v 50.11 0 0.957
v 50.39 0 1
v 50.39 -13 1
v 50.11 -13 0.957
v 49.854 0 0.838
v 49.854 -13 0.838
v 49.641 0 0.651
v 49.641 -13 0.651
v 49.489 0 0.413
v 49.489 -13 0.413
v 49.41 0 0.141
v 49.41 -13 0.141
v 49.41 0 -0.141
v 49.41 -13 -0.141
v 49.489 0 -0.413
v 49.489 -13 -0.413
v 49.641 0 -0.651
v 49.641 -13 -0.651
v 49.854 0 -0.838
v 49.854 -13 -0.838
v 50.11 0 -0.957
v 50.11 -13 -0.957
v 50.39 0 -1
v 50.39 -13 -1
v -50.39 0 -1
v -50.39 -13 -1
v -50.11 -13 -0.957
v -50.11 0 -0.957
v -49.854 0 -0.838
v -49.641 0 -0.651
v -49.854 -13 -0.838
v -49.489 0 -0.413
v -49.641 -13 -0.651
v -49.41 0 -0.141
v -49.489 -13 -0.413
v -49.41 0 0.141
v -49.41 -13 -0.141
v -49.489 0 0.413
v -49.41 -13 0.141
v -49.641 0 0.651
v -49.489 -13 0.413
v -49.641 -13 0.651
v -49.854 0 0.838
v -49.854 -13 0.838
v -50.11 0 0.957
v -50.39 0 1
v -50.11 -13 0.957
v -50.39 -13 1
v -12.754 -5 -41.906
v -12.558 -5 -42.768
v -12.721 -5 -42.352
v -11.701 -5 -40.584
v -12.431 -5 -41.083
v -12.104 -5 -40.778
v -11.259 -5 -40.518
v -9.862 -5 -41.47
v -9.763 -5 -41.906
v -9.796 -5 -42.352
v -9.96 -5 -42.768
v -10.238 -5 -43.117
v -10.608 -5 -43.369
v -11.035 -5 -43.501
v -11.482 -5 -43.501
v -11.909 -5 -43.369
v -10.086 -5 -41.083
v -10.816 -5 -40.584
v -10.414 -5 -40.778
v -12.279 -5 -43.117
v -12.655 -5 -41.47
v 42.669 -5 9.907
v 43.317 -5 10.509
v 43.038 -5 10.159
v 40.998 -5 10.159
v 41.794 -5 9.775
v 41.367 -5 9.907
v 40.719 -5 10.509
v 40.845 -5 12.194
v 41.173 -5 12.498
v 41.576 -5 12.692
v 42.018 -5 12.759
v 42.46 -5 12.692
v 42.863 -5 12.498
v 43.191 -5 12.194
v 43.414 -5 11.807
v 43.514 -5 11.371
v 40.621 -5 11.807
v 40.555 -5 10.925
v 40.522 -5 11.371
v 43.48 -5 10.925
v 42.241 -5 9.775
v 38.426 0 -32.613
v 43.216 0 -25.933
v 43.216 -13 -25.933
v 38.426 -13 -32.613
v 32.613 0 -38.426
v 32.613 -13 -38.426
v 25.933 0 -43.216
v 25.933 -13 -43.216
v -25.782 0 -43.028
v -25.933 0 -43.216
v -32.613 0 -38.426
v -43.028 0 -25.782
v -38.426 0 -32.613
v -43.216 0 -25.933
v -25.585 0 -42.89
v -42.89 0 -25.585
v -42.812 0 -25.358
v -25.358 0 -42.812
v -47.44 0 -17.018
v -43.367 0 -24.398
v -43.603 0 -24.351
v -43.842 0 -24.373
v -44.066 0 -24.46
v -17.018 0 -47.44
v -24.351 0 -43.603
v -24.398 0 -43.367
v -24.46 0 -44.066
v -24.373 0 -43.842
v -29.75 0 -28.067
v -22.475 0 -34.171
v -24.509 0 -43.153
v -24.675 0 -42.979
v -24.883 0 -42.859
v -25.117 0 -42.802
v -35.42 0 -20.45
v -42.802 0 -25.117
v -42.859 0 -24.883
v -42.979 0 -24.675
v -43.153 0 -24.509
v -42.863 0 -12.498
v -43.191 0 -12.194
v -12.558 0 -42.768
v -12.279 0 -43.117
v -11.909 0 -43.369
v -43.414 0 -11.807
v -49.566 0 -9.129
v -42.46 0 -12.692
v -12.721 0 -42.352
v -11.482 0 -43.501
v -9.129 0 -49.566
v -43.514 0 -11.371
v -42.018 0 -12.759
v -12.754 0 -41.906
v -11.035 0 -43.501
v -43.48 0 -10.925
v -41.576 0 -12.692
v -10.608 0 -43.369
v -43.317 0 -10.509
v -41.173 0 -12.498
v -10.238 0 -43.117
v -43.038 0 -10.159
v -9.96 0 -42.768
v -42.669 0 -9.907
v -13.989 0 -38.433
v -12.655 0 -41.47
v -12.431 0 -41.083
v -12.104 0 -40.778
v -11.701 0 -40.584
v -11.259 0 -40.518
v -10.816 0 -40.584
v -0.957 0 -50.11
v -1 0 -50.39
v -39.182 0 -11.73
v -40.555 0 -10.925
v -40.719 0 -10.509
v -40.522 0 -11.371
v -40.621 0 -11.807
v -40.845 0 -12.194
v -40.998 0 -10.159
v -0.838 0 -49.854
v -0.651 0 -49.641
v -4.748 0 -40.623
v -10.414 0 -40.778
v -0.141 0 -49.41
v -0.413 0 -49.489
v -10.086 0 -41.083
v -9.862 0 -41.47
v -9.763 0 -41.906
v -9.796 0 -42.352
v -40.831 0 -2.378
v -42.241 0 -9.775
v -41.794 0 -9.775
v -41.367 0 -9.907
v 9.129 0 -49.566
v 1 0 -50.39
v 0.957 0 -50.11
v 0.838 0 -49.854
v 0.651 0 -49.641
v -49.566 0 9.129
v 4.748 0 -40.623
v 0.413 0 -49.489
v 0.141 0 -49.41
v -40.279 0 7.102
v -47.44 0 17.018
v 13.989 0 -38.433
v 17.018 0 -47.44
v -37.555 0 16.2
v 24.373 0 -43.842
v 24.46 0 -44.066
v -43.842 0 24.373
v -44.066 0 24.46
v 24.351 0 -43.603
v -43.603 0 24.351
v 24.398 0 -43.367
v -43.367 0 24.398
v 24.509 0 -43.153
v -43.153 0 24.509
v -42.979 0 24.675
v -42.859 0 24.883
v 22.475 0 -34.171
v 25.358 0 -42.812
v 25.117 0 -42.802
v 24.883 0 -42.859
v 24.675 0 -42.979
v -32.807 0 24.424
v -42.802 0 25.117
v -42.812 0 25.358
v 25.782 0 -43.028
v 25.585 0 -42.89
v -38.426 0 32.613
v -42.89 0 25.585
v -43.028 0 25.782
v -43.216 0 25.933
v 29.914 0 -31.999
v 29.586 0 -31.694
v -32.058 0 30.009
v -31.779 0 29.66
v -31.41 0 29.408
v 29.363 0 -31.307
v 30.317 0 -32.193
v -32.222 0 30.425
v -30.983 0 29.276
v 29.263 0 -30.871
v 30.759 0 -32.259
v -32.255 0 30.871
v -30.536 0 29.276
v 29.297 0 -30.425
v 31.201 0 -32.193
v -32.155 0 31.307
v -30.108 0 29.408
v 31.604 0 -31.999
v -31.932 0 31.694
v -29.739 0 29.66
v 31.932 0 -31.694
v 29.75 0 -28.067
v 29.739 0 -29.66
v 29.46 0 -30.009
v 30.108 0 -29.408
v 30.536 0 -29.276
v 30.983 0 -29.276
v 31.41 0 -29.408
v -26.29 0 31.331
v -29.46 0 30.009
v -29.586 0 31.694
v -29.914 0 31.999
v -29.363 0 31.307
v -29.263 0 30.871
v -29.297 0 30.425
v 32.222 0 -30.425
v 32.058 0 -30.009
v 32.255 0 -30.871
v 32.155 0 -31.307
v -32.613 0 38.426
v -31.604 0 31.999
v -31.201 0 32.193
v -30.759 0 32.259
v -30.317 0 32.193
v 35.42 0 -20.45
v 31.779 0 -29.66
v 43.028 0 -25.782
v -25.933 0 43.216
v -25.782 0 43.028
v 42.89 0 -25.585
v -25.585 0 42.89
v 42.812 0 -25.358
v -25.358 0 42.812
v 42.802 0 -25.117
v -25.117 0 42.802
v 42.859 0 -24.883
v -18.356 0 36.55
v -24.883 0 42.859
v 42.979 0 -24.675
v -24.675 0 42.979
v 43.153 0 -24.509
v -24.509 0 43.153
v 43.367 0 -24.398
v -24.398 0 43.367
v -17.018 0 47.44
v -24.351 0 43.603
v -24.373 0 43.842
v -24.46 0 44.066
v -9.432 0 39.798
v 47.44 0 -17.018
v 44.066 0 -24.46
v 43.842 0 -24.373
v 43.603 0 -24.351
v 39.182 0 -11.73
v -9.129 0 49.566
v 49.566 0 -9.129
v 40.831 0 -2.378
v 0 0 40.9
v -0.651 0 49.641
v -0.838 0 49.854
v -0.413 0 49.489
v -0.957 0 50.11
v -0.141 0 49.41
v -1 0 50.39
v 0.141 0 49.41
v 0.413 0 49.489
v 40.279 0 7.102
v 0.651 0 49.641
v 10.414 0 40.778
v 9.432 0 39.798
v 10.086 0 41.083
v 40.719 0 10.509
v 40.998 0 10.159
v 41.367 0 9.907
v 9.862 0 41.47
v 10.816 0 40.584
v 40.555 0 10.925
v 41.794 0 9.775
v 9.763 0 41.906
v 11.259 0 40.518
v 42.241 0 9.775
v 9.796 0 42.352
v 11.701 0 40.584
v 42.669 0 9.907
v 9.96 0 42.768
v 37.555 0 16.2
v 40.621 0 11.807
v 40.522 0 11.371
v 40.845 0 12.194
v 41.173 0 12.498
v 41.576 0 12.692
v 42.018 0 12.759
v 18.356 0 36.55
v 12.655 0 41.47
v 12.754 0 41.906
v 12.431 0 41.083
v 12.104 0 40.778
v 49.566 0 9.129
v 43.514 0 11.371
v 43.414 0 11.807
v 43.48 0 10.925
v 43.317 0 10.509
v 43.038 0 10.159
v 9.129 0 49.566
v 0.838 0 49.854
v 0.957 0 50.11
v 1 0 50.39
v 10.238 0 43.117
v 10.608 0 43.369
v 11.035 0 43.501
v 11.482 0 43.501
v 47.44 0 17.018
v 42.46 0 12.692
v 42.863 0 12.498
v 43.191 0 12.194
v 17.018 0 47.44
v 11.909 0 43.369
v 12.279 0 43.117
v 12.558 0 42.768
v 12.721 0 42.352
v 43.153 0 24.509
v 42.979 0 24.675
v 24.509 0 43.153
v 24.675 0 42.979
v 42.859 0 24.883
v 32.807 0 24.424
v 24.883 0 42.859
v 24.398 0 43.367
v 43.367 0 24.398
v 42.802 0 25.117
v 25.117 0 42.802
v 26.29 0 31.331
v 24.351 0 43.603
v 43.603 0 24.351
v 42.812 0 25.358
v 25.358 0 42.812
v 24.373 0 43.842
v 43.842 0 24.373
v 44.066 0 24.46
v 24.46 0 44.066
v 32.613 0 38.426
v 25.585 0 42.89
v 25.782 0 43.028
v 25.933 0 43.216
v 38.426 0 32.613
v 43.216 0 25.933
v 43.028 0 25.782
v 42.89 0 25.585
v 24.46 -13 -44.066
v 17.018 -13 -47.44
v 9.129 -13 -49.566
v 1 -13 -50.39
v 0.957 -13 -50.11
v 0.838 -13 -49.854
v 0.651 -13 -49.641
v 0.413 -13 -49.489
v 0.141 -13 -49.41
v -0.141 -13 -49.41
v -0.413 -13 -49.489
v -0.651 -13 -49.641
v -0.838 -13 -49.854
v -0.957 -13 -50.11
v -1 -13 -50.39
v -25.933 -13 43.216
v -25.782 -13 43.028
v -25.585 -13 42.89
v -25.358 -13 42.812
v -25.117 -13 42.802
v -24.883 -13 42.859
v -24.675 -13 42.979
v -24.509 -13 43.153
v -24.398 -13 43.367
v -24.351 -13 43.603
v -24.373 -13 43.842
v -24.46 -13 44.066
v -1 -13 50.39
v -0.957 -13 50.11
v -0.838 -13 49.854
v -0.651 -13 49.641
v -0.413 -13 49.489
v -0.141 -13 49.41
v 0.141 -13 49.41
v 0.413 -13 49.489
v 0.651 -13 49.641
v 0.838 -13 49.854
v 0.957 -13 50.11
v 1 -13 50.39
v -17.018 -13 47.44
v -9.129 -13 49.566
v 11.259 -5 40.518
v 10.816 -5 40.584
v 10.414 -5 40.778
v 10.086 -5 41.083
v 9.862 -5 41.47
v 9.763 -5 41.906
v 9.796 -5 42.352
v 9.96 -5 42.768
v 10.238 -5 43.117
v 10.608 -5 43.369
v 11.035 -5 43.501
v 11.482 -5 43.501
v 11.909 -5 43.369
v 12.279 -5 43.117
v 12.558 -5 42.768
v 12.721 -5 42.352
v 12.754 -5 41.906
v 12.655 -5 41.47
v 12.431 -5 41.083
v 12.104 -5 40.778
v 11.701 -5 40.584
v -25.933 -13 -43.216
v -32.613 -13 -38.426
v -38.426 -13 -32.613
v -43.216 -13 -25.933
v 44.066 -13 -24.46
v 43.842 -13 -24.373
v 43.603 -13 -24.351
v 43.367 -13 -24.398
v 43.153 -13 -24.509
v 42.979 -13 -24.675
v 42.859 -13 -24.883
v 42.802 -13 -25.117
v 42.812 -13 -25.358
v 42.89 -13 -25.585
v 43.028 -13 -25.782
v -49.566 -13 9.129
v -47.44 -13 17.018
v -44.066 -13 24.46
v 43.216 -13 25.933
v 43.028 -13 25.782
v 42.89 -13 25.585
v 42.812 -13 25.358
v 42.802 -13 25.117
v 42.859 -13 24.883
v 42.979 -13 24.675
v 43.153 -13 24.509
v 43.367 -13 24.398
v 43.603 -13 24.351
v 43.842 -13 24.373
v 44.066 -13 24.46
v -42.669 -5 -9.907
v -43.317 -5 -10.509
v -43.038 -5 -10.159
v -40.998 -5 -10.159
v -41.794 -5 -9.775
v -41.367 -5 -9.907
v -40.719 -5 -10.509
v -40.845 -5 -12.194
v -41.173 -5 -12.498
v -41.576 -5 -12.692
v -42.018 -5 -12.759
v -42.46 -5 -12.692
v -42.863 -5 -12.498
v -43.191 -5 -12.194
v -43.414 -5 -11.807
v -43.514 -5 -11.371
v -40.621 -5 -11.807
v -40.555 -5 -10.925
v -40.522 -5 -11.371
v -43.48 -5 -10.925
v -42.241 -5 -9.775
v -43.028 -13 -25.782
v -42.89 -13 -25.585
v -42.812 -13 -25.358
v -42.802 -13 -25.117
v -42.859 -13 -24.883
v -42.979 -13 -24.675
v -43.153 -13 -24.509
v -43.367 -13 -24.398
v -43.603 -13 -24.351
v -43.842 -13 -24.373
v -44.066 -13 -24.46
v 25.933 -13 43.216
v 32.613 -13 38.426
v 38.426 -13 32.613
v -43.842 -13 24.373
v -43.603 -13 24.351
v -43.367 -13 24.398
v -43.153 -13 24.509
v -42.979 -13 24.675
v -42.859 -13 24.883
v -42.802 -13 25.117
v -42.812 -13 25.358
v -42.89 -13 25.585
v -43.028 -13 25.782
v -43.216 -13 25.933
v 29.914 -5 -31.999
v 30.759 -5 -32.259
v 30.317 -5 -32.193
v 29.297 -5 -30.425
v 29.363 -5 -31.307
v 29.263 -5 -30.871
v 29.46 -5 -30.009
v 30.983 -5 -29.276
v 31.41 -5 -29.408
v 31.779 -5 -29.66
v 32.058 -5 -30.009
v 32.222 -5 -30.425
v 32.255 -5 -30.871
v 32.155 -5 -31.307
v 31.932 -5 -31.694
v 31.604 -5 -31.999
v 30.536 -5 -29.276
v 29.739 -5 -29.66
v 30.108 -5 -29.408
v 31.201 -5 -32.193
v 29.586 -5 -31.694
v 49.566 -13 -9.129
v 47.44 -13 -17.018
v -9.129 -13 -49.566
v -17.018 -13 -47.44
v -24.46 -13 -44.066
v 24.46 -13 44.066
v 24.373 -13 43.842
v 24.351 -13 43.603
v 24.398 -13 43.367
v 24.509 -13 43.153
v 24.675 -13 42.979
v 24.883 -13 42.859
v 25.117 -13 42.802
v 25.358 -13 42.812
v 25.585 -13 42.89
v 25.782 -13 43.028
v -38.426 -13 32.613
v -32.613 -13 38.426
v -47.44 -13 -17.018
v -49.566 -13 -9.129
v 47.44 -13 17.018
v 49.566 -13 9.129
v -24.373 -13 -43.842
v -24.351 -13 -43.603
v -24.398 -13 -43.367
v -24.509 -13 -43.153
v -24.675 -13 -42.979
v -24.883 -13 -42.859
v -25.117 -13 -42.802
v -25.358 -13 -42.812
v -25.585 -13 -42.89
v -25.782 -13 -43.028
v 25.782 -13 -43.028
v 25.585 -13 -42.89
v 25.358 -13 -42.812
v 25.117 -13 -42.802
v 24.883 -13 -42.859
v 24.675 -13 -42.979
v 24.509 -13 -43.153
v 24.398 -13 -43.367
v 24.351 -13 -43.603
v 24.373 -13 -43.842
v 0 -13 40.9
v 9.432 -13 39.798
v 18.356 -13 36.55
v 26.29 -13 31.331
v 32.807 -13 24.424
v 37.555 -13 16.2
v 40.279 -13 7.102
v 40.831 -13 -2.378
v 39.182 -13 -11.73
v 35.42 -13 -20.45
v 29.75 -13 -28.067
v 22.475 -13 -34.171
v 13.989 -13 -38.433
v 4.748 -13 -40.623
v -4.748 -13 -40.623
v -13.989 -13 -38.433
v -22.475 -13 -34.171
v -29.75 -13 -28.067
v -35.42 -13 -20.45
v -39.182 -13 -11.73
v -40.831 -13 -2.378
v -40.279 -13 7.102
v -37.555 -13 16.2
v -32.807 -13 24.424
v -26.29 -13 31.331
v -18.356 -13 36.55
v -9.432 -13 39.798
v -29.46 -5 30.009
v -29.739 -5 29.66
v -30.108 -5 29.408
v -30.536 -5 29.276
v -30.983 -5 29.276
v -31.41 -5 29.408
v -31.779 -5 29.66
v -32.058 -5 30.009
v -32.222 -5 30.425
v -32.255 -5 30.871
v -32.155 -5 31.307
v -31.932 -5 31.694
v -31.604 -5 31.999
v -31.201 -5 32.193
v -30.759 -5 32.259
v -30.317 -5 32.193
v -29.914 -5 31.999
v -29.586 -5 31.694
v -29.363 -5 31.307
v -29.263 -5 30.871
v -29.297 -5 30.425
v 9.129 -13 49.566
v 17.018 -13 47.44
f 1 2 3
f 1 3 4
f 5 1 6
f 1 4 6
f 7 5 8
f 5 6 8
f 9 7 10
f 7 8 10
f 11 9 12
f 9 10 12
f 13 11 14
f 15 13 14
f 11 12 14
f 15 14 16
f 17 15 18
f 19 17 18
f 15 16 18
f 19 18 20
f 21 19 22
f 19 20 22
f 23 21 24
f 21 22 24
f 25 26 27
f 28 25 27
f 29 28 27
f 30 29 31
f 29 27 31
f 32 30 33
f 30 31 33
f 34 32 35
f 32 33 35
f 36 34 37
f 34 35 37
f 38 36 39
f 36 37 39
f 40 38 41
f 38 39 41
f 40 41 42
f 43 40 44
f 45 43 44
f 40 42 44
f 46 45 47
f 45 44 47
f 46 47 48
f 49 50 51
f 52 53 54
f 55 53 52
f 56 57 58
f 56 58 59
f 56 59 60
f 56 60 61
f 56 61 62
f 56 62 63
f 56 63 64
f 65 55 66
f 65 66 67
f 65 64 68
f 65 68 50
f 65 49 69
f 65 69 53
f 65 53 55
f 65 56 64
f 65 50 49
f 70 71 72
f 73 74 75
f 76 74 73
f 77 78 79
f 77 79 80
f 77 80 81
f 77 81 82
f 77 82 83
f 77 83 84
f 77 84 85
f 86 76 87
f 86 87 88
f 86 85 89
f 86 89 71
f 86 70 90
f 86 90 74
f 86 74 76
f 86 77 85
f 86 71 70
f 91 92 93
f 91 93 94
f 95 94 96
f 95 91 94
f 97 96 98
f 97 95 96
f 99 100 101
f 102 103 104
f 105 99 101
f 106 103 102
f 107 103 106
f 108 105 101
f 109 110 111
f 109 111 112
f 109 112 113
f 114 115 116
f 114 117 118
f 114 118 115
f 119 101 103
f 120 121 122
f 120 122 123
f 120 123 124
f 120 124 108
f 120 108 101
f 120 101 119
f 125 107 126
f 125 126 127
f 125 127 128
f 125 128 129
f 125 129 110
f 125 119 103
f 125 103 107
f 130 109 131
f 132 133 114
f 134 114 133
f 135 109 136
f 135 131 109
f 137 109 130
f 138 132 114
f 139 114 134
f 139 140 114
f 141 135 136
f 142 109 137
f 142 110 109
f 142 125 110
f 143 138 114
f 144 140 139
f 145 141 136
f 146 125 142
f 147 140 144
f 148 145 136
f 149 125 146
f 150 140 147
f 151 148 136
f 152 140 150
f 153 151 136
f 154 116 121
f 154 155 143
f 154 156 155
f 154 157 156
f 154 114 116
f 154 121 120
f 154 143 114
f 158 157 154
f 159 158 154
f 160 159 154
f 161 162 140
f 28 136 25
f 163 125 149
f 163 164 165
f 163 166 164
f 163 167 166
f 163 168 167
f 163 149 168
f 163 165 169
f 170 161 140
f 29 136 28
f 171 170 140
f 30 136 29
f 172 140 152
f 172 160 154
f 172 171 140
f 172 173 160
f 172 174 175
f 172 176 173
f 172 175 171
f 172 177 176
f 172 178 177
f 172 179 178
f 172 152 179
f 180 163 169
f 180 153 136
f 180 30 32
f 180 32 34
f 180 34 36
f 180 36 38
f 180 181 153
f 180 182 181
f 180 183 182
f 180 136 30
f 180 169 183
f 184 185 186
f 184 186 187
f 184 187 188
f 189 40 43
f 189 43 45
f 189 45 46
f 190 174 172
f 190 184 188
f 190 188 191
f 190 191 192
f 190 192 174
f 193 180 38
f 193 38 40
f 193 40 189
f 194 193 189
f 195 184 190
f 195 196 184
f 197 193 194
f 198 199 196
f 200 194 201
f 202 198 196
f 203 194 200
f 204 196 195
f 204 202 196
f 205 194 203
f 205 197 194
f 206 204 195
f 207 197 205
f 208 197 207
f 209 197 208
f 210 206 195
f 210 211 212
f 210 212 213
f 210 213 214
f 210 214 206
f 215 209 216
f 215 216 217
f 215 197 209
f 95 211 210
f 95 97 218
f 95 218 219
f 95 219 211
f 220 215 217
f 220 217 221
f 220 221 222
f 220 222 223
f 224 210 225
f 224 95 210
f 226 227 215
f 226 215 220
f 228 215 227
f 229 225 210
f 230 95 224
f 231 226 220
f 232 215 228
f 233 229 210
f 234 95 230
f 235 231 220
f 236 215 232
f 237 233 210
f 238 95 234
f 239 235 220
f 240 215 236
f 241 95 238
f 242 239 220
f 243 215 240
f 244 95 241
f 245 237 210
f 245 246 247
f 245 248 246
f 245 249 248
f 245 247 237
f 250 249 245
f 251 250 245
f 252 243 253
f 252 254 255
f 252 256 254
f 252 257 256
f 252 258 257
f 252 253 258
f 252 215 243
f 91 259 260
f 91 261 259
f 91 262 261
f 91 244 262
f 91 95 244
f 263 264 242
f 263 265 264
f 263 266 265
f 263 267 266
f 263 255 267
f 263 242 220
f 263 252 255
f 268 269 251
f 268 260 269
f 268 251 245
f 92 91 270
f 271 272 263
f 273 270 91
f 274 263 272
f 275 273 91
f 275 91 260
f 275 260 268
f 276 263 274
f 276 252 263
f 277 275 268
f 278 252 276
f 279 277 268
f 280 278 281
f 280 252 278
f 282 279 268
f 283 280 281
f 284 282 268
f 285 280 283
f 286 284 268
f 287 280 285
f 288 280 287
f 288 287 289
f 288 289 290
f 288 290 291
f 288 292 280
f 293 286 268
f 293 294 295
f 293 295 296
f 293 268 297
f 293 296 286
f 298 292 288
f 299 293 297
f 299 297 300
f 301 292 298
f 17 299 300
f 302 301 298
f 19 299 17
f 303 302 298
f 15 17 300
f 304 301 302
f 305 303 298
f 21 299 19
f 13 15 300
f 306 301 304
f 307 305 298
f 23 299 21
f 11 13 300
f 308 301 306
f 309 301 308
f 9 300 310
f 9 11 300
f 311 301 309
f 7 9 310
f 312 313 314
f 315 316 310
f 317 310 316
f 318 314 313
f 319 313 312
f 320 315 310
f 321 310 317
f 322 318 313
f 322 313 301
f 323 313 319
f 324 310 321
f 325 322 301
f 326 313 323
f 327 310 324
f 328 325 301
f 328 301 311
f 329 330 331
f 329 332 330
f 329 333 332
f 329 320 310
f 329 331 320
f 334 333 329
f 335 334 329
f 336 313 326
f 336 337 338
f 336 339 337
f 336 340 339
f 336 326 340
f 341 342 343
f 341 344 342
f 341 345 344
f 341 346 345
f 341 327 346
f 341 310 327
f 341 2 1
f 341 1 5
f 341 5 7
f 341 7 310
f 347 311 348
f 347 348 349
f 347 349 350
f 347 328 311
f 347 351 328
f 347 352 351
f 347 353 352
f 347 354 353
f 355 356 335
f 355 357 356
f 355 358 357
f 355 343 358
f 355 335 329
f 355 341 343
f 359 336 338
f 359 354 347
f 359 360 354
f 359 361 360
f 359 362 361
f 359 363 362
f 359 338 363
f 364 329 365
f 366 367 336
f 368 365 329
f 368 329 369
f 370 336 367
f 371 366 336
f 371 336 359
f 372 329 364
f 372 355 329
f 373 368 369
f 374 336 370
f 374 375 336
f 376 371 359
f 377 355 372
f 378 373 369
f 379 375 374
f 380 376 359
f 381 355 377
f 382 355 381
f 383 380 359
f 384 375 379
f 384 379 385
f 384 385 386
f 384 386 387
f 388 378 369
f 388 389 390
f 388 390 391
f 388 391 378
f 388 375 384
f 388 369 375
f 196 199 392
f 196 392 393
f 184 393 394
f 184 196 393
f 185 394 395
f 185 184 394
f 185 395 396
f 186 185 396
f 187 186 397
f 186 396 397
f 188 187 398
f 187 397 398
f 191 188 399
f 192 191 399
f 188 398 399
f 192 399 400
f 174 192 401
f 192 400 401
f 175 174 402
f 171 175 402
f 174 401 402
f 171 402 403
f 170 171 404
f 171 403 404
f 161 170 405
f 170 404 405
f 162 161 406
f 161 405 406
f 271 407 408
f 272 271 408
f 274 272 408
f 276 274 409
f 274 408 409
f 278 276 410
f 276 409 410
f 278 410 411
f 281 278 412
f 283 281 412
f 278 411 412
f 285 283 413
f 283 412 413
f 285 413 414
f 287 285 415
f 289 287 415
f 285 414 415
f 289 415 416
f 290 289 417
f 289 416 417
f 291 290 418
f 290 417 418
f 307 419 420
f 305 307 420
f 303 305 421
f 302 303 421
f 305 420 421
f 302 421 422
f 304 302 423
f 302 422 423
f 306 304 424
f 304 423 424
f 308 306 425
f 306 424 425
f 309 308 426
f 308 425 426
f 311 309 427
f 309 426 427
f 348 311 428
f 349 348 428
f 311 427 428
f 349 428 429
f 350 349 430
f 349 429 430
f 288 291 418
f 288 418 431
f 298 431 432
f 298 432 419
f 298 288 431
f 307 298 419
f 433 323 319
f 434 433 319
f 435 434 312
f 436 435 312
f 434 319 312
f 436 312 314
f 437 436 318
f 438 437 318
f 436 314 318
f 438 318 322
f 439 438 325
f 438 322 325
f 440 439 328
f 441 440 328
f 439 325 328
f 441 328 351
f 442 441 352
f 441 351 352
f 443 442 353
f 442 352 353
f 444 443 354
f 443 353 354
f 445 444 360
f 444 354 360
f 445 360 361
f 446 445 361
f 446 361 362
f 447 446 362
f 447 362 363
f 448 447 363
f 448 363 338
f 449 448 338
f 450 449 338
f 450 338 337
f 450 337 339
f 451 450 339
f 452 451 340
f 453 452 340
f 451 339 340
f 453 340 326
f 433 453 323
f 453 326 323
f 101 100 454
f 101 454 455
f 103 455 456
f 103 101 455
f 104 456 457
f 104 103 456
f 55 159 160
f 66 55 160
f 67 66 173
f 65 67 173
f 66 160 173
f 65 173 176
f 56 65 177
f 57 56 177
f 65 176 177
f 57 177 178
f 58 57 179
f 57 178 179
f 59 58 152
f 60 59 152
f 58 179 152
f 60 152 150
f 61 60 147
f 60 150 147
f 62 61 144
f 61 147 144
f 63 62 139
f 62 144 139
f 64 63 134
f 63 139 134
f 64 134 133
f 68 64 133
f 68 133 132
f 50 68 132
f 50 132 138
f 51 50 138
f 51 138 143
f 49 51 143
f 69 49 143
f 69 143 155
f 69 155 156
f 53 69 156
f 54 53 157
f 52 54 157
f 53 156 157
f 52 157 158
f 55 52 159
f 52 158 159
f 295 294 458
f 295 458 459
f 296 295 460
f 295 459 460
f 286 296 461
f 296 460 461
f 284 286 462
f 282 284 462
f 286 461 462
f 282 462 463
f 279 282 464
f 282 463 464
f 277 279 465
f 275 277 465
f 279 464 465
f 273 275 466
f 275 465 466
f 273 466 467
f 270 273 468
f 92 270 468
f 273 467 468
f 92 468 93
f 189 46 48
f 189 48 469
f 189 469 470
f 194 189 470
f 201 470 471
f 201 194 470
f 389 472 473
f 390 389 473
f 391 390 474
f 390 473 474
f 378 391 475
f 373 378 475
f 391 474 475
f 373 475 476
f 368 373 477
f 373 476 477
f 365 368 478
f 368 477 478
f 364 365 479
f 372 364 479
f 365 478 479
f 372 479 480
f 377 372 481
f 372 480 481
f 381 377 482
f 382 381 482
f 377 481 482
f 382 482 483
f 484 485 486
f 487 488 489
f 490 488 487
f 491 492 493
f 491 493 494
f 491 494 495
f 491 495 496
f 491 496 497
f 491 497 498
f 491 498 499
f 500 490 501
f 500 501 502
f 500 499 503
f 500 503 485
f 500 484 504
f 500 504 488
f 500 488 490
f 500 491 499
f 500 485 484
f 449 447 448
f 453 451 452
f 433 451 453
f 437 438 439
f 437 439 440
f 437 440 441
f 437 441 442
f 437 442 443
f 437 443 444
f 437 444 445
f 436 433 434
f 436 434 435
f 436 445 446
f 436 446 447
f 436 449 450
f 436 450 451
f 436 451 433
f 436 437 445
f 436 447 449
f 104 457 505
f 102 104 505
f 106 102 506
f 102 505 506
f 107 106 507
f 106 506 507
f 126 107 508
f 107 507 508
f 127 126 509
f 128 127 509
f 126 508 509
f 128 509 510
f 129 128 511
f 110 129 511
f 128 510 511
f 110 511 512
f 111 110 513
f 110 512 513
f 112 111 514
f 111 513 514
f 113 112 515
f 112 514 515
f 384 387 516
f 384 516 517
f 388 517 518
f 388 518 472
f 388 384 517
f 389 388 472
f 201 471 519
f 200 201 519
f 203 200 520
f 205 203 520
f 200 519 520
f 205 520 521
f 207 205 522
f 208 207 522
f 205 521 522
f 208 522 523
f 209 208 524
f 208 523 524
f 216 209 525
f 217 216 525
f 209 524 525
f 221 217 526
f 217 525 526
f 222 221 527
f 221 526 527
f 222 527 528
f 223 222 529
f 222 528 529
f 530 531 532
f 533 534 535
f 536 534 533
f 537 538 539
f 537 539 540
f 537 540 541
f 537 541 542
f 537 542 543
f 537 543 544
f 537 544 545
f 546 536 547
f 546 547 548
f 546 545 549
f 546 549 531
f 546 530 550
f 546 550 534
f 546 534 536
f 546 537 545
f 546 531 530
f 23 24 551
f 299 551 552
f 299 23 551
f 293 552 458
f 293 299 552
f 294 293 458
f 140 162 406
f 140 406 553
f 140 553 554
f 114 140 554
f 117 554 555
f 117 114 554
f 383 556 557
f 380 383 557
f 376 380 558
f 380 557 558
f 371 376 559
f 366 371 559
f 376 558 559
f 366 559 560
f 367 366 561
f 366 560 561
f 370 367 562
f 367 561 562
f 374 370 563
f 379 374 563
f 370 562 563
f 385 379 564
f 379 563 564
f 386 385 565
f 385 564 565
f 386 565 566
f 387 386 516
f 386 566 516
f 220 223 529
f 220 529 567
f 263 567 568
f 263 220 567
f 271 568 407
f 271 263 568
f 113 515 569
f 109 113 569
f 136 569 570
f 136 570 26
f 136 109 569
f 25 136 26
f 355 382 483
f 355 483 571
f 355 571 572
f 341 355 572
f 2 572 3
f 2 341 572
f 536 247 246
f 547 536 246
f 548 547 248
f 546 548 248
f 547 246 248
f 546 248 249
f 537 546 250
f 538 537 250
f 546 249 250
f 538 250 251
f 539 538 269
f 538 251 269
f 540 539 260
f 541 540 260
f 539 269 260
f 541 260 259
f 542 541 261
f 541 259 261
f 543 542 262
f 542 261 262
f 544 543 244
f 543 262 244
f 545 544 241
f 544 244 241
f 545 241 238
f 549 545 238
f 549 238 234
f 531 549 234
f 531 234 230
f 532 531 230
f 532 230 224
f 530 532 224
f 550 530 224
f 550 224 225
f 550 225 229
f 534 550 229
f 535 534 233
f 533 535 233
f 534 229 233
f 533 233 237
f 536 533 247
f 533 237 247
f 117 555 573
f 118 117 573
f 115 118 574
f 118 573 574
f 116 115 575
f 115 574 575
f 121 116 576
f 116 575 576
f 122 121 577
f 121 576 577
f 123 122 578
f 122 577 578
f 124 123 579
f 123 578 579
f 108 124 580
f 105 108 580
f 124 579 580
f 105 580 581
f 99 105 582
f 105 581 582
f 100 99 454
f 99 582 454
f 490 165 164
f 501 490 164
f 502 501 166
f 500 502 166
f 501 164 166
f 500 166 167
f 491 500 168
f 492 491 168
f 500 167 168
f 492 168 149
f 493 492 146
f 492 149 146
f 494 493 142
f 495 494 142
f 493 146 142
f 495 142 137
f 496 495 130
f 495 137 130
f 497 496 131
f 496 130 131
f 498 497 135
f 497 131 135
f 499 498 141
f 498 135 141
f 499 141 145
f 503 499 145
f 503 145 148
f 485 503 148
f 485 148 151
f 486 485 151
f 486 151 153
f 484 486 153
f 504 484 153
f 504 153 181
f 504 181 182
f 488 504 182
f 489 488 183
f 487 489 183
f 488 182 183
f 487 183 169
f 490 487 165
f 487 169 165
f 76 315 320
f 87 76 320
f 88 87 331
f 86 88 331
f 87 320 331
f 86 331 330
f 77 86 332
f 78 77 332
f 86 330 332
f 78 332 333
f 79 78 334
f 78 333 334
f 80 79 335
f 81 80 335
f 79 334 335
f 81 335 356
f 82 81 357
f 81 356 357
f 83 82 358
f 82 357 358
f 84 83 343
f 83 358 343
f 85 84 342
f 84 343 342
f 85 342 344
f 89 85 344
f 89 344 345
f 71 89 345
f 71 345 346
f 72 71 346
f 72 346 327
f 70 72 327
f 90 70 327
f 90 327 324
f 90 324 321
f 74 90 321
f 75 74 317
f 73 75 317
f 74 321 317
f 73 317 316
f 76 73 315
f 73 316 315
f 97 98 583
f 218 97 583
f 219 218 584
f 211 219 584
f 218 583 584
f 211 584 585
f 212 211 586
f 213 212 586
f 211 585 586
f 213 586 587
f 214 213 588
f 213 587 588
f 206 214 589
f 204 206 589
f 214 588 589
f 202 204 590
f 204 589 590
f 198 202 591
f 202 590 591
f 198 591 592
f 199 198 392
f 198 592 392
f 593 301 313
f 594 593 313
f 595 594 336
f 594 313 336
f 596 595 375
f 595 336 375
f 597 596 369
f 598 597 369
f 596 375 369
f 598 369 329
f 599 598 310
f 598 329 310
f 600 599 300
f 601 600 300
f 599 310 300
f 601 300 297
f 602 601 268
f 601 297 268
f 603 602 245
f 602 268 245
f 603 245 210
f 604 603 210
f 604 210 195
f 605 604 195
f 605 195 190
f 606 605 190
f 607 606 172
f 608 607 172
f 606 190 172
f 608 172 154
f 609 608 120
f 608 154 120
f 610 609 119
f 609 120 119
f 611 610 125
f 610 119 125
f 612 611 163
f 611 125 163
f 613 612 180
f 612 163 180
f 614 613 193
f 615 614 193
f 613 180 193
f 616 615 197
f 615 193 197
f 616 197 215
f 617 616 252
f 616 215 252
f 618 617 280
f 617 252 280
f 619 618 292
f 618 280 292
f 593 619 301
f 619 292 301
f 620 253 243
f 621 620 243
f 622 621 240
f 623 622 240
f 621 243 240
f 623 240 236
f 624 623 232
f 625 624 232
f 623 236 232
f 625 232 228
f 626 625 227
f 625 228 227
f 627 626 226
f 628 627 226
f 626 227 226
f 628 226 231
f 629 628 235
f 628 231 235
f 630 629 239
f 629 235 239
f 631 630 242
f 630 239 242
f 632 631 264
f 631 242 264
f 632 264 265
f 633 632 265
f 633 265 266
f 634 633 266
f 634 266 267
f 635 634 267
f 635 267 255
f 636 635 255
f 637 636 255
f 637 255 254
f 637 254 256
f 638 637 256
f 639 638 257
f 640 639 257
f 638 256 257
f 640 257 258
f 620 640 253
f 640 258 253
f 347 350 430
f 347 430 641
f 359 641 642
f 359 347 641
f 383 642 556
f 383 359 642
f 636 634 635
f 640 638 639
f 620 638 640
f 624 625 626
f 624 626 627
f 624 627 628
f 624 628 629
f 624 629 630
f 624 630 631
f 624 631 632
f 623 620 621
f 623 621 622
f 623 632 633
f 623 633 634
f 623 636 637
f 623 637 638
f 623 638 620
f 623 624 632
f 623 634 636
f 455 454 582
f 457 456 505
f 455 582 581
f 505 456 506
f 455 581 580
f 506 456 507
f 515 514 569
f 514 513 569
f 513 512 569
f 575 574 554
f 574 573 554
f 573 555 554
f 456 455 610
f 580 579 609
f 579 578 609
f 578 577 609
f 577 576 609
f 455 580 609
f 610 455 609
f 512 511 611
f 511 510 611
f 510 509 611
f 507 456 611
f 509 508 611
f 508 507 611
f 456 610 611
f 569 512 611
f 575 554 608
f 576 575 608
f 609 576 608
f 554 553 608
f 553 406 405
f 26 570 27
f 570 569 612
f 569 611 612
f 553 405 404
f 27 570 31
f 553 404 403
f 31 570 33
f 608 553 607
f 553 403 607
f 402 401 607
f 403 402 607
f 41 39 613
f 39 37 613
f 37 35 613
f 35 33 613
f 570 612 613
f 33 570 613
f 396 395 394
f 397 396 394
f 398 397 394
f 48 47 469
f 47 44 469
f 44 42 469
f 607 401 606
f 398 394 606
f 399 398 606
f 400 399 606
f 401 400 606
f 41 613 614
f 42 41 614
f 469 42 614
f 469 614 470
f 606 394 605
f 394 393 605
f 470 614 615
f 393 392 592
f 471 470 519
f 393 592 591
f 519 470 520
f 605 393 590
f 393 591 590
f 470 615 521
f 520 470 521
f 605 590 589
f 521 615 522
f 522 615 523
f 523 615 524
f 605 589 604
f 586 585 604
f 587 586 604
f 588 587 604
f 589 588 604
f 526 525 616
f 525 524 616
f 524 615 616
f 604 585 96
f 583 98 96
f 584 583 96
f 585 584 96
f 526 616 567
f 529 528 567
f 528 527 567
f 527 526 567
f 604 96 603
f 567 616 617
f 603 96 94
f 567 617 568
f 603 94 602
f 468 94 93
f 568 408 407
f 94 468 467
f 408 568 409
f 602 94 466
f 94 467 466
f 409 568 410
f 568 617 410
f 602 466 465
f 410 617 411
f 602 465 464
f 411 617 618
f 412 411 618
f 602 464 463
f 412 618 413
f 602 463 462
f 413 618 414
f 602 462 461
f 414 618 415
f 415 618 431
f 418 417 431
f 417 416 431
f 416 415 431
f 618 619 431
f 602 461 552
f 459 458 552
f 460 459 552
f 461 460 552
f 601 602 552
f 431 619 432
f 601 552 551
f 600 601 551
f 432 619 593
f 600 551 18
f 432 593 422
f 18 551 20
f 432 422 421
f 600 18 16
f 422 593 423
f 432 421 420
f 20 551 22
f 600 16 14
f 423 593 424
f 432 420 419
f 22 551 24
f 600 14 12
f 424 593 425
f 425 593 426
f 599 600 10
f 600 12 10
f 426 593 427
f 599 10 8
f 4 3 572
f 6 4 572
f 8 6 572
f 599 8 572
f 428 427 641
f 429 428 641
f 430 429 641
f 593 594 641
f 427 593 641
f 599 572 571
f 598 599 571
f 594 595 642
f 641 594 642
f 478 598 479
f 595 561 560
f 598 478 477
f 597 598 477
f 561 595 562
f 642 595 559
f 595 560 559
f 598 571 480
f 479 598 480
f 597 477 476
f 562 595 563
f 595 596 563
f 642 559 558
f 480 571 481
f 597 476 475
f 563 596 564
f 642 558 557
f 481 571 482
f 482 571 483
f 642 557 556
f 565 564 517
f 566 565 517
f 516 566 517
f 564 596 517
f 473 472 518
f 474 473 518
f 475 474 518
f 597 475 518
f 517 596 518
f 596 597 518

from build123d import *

# Parameters (mm, degrees)
SKETCH_1_R               = 50.4
SKETCH_1_R_2             = 40.9
EXTRUDE_1_DEPTH          = 13
SKETCH_2_R               = 1
SKETCH_2_R_2             = 0.85
CUT_EXTRUDE_1_DEPTH      = 13
SKETCH_3_R               = 1.5
CUT_EXTRUDE_2_DEPTH      = 5
PATTERN_CIRCULAR_1_COUNT = 6


with BuildPart() as part:
    # 草图1 → 凸台-拉伸1 (new body)
    with BuildSketch(Plane(origin=(0, 0, 0), x_dir=(1, 0, 0), z_dir=(0, 1, 0))):
        with Locations(Location((0, 0, 0), (0, 0, 270))):
            Circle(SKETCH_1_R)
        with Locations(Location((0, 0, 0), (0, 0, 270))):
            Circle(SKETCH_1_R_2, mode=Mode.SUBTRACT)
    extrude(amount=-EXTRUDE_1_DEPTH)

    # 草图2 → 切除-拉伸1 (cut)
    with BuildSketch(Plane.XZ.offset(13)):
        with Locations((0, 50.4)):
            Circle(SKETCH_2_R)
        with Locations((50.4, 0)):
            Circle(SKETCH_2_R)
        with Locations((0, -50.4)):
            Circle(SKETCH_2_R)
        with Locations((-50.4, 0)):
            Circle(SKETCH_2_R)
        with Locations((-25.2, 43.647680351)):
            Circle(SKETCH_2_R_2)
        with Locations((25.2, 43.647680351)):
            Circle(SKETCH_2_R_2)
        with Locations((43.647680351, 25.2)):
            Circle(SKETCH_2_R_2)
        with Locations((43.647680351, -25.2)):
            Circle(SKETCH_2_R_2)
        with Locations((25.2, -43.647680351)):
            Circle(SKETCH_2_R_2)
        with Locations((-25.2, -43.647680351)):
            Circle(SKETCH_2_R_2)
        with Locations((-43.647680351, -25.2)):
            Circle(SKETCH_2_R_2)
        with Locations((-43.647680351, 25.2)):
            Circle(SKETCH_2_R_2)
    extrude(amount=-CUT_EXTRUDE_1_DEPTH, mode=Mode.SUBTRACT)

    # 草图3 → 切除-拉伸2 (cut)
    with BuildSketch(Plane(origin=(0, 0, 0), x_dir=(1, 0, 0), z_dir=(0, 1, 0))):
        with Locations(Location((-11.258628462, 42.017773444, 0), (0, 0, 270))):
            Circle(SKETCH_3_R)
    cut_extrude_2 = extrude(amount=-CUT_EXTRUDE_2_DEPTH, mode=Mode.SUBTRACT)

    # 阵列(圆周)1: 切除-拉伸2 ×6 about axis
    pattern_circular_1_axis = Axis((0, 0, 0), (0, 1, 0))
    for i in range(1, PATTERN_CIRCULAR_1_COUNT):
        add(cut_extrude_2.rotate(pattern_circular_1_axis, i * 360 / PATTERN_CIRCULAR_1_COUNT), mode=Mode.SUBTRACT)


solid = part.part
